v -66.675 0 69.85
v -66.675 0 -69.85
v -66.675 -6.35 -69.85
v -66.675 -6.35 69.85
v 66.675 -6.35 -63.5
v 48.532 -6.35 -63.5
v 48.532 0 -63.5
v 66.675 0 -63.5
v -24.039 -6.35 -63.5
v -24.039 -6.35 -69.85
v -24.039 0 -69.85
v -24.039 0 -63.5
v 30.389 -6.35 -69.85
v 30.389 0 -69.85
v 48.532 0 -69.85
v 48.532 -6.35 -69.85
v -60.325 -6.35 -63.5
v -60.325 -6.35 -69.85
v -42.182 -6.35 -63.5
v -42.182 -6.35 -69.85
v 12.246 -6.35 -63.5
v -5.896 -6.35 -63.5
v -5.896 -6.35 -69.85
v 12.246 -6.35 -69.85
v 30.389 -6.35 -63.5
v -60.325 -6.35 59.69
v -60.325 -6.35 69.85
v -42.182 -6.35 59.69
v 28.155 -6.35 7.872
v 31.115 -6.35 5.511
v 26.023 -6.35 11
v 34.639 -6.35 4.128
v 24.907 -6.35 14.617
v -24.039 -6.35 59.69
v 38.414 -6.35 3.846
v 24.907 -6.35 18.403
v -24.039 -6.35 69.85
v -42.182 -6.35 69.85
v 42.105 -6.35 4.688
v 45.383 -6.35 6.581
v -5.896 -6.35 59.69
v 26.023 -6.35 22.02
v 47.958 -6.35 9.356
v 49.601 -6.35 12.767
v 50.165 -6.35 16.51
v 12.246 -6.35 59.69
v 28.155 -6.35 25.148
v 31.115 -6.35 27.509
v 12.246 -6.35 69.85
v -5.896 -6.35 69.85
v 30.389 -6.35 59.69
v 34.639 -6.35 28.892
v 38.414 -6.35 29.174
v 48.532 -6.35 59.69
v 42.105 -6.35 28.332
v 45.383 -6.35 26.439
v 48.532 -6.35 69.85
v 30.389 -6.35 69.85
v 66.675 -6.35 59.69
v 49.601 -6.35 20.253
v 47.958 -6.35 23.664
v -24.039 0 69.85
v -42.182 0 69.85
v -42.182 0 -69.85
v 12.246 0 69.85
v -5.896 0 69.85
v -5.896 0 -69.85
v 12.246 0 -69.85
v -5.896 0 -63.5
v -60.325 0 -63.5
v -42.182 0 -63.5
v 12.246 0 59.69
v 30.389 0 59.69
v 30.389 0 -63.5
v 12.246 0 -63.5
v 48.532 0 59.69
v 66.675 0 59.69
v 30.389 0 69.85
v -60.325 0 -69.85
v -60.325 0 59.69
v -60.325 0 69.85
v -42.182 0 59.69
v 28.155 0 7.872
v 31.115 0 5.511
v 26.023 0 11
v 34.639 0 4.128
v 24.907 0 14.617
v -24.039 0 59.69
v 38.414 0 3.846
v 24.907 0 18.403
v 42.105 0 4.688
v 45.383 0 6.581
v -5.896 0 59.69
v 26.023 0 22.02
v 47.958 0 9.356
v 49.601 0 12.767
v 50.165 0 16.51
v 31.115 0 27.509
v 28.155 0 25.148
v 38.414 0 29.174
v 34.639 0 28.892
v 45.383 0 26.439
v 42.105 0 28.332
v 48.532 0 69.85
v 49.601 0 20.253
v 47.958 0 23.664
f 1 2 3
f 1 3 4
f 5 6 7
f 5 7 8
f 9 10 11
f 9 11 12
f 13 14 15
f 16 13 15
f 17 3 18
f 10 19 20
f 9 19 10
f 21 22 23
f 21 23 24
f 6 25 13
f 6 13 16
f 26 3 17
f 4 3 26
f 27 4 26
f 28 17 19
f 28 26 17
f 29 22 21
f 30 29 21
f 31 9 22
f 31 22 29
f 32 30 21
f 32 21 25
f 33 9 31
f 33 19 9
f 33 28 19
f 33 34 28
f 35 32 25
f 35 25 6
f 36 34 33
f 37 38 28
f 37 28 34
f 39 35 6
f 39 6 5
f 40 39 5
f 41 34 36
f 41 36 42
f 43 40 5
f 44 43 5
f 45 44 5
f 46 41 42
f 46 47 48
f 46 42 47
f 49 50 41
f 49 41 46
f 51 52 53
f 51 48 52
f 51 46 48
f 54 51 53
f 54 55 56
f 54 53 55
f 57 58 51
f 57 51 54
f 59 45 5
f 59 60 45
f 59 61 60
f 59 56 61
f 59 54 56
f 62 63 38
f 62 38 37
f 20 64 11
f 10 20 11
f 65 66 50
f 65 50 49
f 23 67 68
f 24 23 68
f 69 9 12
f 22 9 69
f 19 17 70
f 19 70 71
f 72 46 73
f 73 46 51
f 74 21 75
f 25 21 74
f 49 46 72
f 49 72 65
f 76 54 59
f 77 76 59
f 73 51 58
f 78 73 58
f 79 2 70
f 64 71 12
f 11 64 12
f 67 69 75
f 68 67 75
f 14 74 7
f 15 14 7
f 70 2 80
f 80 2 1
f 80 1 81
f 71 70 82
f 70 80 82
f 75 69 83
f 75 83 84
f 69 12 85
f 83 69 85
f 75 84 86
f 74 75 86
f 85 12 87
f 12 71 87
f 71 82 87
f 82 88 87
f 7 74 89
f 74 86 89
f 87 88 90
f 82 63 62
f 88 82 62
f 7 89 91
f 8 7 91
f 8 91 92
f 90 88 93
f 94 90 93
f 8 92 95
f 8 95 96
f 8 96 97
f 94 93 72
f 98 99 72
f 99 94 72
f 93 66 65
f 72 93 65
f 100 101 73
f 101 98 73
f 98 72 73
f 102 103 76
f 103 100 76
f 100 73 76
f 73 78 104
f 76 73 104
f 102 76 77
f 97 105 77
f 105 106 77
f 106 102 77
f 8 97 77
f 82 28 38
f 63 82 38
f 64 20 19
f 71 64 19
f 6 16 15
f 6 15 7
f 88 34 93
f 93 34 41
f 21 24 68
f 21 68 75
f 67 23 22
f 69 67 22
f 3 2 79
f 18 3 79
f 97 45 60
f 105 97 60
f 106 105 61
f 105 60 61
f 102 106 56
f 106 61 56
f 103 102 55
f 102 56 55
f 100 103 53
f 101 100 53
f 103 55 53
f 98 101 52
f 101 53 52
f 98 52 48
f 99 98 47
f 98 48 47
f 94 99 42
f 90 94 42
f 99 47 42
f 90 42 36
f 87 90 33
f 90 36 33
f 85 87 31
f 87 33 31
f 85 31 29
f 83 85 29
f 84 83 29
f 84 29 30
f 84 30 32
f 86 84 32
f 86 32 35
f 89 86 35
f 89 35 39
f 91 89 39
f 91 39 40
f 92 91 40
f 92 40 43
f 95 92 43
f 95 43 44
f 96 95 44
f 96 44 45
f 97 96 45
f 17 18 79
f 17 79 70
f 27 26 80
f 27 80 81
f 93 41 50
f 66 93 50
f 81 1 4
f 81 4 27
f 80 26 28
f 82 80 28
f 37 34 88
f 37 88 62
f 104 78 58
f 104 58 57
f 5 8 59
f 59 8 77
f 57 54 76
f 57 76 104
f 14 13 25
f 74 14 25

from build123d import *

# Parameters (mm, degrees)
F0_W     = 133.35
F0_H     = 139.7
F1_DEPTH = 6.35
F2_W     = 18.1428571429
F2_H     = 10.16
F2_H_2   = 6.35
F3_DEPTH = 25.4
F4_R     = 12.7
F5_DEPTH = 25.4


with BuildPart() as f1:
    # F0 (on Front) → F1 (new body)
    with BuildSketch(Plane.XZ):
        Rectangle(F0_W, F0_H)
    extrude(amount=F1_DEPTH)

    # F2 (on face) → F3 (cut)
    with BuildSketch(Plane.XZ.offset(6.35)):
        with Locations((57.6035714286, 64.77)):
            Rectangle(F2_W, F2_H)
        with Locations((-51.2535714286, 64.77)):
            Rectangle(F2_W, F2_H)
        with Locations((-14.9678571429, 64.77)):
            Rectangle(F2_W, F2_H)
        with Locations((21.3178571429, 64.77)):
            Rectangle(F2_W, F2_H)
        with Locations((-51.2535714286, -66.675)):
            Rectangle(F2_W, F2_H_2)
        with Locations((-14.9678571429, -66.675)):
            Rectangle(F2_W, F2_H_2)
        with Locations((21.3178571429, -66.675)):
            Rectangle(F2_W, F2_H_2)
        with Locations((57.6035714286, -66.675)):
            Rectangle(F2_W, F2_H_2)
    extrude(amount=-F3_DEPTH, mode=Mode.SUBTRACT)

    # F4 (on face) → F5 (cut)
    with BuildSketch(Plane.XZ.offset(6.35)):
        with Locations((37.465, 16.51)):
            Circle(F4_R)
    extrude(amount=-F5_DEPTH, mode=Mode.SUBTRACT)


solid = f1.part
